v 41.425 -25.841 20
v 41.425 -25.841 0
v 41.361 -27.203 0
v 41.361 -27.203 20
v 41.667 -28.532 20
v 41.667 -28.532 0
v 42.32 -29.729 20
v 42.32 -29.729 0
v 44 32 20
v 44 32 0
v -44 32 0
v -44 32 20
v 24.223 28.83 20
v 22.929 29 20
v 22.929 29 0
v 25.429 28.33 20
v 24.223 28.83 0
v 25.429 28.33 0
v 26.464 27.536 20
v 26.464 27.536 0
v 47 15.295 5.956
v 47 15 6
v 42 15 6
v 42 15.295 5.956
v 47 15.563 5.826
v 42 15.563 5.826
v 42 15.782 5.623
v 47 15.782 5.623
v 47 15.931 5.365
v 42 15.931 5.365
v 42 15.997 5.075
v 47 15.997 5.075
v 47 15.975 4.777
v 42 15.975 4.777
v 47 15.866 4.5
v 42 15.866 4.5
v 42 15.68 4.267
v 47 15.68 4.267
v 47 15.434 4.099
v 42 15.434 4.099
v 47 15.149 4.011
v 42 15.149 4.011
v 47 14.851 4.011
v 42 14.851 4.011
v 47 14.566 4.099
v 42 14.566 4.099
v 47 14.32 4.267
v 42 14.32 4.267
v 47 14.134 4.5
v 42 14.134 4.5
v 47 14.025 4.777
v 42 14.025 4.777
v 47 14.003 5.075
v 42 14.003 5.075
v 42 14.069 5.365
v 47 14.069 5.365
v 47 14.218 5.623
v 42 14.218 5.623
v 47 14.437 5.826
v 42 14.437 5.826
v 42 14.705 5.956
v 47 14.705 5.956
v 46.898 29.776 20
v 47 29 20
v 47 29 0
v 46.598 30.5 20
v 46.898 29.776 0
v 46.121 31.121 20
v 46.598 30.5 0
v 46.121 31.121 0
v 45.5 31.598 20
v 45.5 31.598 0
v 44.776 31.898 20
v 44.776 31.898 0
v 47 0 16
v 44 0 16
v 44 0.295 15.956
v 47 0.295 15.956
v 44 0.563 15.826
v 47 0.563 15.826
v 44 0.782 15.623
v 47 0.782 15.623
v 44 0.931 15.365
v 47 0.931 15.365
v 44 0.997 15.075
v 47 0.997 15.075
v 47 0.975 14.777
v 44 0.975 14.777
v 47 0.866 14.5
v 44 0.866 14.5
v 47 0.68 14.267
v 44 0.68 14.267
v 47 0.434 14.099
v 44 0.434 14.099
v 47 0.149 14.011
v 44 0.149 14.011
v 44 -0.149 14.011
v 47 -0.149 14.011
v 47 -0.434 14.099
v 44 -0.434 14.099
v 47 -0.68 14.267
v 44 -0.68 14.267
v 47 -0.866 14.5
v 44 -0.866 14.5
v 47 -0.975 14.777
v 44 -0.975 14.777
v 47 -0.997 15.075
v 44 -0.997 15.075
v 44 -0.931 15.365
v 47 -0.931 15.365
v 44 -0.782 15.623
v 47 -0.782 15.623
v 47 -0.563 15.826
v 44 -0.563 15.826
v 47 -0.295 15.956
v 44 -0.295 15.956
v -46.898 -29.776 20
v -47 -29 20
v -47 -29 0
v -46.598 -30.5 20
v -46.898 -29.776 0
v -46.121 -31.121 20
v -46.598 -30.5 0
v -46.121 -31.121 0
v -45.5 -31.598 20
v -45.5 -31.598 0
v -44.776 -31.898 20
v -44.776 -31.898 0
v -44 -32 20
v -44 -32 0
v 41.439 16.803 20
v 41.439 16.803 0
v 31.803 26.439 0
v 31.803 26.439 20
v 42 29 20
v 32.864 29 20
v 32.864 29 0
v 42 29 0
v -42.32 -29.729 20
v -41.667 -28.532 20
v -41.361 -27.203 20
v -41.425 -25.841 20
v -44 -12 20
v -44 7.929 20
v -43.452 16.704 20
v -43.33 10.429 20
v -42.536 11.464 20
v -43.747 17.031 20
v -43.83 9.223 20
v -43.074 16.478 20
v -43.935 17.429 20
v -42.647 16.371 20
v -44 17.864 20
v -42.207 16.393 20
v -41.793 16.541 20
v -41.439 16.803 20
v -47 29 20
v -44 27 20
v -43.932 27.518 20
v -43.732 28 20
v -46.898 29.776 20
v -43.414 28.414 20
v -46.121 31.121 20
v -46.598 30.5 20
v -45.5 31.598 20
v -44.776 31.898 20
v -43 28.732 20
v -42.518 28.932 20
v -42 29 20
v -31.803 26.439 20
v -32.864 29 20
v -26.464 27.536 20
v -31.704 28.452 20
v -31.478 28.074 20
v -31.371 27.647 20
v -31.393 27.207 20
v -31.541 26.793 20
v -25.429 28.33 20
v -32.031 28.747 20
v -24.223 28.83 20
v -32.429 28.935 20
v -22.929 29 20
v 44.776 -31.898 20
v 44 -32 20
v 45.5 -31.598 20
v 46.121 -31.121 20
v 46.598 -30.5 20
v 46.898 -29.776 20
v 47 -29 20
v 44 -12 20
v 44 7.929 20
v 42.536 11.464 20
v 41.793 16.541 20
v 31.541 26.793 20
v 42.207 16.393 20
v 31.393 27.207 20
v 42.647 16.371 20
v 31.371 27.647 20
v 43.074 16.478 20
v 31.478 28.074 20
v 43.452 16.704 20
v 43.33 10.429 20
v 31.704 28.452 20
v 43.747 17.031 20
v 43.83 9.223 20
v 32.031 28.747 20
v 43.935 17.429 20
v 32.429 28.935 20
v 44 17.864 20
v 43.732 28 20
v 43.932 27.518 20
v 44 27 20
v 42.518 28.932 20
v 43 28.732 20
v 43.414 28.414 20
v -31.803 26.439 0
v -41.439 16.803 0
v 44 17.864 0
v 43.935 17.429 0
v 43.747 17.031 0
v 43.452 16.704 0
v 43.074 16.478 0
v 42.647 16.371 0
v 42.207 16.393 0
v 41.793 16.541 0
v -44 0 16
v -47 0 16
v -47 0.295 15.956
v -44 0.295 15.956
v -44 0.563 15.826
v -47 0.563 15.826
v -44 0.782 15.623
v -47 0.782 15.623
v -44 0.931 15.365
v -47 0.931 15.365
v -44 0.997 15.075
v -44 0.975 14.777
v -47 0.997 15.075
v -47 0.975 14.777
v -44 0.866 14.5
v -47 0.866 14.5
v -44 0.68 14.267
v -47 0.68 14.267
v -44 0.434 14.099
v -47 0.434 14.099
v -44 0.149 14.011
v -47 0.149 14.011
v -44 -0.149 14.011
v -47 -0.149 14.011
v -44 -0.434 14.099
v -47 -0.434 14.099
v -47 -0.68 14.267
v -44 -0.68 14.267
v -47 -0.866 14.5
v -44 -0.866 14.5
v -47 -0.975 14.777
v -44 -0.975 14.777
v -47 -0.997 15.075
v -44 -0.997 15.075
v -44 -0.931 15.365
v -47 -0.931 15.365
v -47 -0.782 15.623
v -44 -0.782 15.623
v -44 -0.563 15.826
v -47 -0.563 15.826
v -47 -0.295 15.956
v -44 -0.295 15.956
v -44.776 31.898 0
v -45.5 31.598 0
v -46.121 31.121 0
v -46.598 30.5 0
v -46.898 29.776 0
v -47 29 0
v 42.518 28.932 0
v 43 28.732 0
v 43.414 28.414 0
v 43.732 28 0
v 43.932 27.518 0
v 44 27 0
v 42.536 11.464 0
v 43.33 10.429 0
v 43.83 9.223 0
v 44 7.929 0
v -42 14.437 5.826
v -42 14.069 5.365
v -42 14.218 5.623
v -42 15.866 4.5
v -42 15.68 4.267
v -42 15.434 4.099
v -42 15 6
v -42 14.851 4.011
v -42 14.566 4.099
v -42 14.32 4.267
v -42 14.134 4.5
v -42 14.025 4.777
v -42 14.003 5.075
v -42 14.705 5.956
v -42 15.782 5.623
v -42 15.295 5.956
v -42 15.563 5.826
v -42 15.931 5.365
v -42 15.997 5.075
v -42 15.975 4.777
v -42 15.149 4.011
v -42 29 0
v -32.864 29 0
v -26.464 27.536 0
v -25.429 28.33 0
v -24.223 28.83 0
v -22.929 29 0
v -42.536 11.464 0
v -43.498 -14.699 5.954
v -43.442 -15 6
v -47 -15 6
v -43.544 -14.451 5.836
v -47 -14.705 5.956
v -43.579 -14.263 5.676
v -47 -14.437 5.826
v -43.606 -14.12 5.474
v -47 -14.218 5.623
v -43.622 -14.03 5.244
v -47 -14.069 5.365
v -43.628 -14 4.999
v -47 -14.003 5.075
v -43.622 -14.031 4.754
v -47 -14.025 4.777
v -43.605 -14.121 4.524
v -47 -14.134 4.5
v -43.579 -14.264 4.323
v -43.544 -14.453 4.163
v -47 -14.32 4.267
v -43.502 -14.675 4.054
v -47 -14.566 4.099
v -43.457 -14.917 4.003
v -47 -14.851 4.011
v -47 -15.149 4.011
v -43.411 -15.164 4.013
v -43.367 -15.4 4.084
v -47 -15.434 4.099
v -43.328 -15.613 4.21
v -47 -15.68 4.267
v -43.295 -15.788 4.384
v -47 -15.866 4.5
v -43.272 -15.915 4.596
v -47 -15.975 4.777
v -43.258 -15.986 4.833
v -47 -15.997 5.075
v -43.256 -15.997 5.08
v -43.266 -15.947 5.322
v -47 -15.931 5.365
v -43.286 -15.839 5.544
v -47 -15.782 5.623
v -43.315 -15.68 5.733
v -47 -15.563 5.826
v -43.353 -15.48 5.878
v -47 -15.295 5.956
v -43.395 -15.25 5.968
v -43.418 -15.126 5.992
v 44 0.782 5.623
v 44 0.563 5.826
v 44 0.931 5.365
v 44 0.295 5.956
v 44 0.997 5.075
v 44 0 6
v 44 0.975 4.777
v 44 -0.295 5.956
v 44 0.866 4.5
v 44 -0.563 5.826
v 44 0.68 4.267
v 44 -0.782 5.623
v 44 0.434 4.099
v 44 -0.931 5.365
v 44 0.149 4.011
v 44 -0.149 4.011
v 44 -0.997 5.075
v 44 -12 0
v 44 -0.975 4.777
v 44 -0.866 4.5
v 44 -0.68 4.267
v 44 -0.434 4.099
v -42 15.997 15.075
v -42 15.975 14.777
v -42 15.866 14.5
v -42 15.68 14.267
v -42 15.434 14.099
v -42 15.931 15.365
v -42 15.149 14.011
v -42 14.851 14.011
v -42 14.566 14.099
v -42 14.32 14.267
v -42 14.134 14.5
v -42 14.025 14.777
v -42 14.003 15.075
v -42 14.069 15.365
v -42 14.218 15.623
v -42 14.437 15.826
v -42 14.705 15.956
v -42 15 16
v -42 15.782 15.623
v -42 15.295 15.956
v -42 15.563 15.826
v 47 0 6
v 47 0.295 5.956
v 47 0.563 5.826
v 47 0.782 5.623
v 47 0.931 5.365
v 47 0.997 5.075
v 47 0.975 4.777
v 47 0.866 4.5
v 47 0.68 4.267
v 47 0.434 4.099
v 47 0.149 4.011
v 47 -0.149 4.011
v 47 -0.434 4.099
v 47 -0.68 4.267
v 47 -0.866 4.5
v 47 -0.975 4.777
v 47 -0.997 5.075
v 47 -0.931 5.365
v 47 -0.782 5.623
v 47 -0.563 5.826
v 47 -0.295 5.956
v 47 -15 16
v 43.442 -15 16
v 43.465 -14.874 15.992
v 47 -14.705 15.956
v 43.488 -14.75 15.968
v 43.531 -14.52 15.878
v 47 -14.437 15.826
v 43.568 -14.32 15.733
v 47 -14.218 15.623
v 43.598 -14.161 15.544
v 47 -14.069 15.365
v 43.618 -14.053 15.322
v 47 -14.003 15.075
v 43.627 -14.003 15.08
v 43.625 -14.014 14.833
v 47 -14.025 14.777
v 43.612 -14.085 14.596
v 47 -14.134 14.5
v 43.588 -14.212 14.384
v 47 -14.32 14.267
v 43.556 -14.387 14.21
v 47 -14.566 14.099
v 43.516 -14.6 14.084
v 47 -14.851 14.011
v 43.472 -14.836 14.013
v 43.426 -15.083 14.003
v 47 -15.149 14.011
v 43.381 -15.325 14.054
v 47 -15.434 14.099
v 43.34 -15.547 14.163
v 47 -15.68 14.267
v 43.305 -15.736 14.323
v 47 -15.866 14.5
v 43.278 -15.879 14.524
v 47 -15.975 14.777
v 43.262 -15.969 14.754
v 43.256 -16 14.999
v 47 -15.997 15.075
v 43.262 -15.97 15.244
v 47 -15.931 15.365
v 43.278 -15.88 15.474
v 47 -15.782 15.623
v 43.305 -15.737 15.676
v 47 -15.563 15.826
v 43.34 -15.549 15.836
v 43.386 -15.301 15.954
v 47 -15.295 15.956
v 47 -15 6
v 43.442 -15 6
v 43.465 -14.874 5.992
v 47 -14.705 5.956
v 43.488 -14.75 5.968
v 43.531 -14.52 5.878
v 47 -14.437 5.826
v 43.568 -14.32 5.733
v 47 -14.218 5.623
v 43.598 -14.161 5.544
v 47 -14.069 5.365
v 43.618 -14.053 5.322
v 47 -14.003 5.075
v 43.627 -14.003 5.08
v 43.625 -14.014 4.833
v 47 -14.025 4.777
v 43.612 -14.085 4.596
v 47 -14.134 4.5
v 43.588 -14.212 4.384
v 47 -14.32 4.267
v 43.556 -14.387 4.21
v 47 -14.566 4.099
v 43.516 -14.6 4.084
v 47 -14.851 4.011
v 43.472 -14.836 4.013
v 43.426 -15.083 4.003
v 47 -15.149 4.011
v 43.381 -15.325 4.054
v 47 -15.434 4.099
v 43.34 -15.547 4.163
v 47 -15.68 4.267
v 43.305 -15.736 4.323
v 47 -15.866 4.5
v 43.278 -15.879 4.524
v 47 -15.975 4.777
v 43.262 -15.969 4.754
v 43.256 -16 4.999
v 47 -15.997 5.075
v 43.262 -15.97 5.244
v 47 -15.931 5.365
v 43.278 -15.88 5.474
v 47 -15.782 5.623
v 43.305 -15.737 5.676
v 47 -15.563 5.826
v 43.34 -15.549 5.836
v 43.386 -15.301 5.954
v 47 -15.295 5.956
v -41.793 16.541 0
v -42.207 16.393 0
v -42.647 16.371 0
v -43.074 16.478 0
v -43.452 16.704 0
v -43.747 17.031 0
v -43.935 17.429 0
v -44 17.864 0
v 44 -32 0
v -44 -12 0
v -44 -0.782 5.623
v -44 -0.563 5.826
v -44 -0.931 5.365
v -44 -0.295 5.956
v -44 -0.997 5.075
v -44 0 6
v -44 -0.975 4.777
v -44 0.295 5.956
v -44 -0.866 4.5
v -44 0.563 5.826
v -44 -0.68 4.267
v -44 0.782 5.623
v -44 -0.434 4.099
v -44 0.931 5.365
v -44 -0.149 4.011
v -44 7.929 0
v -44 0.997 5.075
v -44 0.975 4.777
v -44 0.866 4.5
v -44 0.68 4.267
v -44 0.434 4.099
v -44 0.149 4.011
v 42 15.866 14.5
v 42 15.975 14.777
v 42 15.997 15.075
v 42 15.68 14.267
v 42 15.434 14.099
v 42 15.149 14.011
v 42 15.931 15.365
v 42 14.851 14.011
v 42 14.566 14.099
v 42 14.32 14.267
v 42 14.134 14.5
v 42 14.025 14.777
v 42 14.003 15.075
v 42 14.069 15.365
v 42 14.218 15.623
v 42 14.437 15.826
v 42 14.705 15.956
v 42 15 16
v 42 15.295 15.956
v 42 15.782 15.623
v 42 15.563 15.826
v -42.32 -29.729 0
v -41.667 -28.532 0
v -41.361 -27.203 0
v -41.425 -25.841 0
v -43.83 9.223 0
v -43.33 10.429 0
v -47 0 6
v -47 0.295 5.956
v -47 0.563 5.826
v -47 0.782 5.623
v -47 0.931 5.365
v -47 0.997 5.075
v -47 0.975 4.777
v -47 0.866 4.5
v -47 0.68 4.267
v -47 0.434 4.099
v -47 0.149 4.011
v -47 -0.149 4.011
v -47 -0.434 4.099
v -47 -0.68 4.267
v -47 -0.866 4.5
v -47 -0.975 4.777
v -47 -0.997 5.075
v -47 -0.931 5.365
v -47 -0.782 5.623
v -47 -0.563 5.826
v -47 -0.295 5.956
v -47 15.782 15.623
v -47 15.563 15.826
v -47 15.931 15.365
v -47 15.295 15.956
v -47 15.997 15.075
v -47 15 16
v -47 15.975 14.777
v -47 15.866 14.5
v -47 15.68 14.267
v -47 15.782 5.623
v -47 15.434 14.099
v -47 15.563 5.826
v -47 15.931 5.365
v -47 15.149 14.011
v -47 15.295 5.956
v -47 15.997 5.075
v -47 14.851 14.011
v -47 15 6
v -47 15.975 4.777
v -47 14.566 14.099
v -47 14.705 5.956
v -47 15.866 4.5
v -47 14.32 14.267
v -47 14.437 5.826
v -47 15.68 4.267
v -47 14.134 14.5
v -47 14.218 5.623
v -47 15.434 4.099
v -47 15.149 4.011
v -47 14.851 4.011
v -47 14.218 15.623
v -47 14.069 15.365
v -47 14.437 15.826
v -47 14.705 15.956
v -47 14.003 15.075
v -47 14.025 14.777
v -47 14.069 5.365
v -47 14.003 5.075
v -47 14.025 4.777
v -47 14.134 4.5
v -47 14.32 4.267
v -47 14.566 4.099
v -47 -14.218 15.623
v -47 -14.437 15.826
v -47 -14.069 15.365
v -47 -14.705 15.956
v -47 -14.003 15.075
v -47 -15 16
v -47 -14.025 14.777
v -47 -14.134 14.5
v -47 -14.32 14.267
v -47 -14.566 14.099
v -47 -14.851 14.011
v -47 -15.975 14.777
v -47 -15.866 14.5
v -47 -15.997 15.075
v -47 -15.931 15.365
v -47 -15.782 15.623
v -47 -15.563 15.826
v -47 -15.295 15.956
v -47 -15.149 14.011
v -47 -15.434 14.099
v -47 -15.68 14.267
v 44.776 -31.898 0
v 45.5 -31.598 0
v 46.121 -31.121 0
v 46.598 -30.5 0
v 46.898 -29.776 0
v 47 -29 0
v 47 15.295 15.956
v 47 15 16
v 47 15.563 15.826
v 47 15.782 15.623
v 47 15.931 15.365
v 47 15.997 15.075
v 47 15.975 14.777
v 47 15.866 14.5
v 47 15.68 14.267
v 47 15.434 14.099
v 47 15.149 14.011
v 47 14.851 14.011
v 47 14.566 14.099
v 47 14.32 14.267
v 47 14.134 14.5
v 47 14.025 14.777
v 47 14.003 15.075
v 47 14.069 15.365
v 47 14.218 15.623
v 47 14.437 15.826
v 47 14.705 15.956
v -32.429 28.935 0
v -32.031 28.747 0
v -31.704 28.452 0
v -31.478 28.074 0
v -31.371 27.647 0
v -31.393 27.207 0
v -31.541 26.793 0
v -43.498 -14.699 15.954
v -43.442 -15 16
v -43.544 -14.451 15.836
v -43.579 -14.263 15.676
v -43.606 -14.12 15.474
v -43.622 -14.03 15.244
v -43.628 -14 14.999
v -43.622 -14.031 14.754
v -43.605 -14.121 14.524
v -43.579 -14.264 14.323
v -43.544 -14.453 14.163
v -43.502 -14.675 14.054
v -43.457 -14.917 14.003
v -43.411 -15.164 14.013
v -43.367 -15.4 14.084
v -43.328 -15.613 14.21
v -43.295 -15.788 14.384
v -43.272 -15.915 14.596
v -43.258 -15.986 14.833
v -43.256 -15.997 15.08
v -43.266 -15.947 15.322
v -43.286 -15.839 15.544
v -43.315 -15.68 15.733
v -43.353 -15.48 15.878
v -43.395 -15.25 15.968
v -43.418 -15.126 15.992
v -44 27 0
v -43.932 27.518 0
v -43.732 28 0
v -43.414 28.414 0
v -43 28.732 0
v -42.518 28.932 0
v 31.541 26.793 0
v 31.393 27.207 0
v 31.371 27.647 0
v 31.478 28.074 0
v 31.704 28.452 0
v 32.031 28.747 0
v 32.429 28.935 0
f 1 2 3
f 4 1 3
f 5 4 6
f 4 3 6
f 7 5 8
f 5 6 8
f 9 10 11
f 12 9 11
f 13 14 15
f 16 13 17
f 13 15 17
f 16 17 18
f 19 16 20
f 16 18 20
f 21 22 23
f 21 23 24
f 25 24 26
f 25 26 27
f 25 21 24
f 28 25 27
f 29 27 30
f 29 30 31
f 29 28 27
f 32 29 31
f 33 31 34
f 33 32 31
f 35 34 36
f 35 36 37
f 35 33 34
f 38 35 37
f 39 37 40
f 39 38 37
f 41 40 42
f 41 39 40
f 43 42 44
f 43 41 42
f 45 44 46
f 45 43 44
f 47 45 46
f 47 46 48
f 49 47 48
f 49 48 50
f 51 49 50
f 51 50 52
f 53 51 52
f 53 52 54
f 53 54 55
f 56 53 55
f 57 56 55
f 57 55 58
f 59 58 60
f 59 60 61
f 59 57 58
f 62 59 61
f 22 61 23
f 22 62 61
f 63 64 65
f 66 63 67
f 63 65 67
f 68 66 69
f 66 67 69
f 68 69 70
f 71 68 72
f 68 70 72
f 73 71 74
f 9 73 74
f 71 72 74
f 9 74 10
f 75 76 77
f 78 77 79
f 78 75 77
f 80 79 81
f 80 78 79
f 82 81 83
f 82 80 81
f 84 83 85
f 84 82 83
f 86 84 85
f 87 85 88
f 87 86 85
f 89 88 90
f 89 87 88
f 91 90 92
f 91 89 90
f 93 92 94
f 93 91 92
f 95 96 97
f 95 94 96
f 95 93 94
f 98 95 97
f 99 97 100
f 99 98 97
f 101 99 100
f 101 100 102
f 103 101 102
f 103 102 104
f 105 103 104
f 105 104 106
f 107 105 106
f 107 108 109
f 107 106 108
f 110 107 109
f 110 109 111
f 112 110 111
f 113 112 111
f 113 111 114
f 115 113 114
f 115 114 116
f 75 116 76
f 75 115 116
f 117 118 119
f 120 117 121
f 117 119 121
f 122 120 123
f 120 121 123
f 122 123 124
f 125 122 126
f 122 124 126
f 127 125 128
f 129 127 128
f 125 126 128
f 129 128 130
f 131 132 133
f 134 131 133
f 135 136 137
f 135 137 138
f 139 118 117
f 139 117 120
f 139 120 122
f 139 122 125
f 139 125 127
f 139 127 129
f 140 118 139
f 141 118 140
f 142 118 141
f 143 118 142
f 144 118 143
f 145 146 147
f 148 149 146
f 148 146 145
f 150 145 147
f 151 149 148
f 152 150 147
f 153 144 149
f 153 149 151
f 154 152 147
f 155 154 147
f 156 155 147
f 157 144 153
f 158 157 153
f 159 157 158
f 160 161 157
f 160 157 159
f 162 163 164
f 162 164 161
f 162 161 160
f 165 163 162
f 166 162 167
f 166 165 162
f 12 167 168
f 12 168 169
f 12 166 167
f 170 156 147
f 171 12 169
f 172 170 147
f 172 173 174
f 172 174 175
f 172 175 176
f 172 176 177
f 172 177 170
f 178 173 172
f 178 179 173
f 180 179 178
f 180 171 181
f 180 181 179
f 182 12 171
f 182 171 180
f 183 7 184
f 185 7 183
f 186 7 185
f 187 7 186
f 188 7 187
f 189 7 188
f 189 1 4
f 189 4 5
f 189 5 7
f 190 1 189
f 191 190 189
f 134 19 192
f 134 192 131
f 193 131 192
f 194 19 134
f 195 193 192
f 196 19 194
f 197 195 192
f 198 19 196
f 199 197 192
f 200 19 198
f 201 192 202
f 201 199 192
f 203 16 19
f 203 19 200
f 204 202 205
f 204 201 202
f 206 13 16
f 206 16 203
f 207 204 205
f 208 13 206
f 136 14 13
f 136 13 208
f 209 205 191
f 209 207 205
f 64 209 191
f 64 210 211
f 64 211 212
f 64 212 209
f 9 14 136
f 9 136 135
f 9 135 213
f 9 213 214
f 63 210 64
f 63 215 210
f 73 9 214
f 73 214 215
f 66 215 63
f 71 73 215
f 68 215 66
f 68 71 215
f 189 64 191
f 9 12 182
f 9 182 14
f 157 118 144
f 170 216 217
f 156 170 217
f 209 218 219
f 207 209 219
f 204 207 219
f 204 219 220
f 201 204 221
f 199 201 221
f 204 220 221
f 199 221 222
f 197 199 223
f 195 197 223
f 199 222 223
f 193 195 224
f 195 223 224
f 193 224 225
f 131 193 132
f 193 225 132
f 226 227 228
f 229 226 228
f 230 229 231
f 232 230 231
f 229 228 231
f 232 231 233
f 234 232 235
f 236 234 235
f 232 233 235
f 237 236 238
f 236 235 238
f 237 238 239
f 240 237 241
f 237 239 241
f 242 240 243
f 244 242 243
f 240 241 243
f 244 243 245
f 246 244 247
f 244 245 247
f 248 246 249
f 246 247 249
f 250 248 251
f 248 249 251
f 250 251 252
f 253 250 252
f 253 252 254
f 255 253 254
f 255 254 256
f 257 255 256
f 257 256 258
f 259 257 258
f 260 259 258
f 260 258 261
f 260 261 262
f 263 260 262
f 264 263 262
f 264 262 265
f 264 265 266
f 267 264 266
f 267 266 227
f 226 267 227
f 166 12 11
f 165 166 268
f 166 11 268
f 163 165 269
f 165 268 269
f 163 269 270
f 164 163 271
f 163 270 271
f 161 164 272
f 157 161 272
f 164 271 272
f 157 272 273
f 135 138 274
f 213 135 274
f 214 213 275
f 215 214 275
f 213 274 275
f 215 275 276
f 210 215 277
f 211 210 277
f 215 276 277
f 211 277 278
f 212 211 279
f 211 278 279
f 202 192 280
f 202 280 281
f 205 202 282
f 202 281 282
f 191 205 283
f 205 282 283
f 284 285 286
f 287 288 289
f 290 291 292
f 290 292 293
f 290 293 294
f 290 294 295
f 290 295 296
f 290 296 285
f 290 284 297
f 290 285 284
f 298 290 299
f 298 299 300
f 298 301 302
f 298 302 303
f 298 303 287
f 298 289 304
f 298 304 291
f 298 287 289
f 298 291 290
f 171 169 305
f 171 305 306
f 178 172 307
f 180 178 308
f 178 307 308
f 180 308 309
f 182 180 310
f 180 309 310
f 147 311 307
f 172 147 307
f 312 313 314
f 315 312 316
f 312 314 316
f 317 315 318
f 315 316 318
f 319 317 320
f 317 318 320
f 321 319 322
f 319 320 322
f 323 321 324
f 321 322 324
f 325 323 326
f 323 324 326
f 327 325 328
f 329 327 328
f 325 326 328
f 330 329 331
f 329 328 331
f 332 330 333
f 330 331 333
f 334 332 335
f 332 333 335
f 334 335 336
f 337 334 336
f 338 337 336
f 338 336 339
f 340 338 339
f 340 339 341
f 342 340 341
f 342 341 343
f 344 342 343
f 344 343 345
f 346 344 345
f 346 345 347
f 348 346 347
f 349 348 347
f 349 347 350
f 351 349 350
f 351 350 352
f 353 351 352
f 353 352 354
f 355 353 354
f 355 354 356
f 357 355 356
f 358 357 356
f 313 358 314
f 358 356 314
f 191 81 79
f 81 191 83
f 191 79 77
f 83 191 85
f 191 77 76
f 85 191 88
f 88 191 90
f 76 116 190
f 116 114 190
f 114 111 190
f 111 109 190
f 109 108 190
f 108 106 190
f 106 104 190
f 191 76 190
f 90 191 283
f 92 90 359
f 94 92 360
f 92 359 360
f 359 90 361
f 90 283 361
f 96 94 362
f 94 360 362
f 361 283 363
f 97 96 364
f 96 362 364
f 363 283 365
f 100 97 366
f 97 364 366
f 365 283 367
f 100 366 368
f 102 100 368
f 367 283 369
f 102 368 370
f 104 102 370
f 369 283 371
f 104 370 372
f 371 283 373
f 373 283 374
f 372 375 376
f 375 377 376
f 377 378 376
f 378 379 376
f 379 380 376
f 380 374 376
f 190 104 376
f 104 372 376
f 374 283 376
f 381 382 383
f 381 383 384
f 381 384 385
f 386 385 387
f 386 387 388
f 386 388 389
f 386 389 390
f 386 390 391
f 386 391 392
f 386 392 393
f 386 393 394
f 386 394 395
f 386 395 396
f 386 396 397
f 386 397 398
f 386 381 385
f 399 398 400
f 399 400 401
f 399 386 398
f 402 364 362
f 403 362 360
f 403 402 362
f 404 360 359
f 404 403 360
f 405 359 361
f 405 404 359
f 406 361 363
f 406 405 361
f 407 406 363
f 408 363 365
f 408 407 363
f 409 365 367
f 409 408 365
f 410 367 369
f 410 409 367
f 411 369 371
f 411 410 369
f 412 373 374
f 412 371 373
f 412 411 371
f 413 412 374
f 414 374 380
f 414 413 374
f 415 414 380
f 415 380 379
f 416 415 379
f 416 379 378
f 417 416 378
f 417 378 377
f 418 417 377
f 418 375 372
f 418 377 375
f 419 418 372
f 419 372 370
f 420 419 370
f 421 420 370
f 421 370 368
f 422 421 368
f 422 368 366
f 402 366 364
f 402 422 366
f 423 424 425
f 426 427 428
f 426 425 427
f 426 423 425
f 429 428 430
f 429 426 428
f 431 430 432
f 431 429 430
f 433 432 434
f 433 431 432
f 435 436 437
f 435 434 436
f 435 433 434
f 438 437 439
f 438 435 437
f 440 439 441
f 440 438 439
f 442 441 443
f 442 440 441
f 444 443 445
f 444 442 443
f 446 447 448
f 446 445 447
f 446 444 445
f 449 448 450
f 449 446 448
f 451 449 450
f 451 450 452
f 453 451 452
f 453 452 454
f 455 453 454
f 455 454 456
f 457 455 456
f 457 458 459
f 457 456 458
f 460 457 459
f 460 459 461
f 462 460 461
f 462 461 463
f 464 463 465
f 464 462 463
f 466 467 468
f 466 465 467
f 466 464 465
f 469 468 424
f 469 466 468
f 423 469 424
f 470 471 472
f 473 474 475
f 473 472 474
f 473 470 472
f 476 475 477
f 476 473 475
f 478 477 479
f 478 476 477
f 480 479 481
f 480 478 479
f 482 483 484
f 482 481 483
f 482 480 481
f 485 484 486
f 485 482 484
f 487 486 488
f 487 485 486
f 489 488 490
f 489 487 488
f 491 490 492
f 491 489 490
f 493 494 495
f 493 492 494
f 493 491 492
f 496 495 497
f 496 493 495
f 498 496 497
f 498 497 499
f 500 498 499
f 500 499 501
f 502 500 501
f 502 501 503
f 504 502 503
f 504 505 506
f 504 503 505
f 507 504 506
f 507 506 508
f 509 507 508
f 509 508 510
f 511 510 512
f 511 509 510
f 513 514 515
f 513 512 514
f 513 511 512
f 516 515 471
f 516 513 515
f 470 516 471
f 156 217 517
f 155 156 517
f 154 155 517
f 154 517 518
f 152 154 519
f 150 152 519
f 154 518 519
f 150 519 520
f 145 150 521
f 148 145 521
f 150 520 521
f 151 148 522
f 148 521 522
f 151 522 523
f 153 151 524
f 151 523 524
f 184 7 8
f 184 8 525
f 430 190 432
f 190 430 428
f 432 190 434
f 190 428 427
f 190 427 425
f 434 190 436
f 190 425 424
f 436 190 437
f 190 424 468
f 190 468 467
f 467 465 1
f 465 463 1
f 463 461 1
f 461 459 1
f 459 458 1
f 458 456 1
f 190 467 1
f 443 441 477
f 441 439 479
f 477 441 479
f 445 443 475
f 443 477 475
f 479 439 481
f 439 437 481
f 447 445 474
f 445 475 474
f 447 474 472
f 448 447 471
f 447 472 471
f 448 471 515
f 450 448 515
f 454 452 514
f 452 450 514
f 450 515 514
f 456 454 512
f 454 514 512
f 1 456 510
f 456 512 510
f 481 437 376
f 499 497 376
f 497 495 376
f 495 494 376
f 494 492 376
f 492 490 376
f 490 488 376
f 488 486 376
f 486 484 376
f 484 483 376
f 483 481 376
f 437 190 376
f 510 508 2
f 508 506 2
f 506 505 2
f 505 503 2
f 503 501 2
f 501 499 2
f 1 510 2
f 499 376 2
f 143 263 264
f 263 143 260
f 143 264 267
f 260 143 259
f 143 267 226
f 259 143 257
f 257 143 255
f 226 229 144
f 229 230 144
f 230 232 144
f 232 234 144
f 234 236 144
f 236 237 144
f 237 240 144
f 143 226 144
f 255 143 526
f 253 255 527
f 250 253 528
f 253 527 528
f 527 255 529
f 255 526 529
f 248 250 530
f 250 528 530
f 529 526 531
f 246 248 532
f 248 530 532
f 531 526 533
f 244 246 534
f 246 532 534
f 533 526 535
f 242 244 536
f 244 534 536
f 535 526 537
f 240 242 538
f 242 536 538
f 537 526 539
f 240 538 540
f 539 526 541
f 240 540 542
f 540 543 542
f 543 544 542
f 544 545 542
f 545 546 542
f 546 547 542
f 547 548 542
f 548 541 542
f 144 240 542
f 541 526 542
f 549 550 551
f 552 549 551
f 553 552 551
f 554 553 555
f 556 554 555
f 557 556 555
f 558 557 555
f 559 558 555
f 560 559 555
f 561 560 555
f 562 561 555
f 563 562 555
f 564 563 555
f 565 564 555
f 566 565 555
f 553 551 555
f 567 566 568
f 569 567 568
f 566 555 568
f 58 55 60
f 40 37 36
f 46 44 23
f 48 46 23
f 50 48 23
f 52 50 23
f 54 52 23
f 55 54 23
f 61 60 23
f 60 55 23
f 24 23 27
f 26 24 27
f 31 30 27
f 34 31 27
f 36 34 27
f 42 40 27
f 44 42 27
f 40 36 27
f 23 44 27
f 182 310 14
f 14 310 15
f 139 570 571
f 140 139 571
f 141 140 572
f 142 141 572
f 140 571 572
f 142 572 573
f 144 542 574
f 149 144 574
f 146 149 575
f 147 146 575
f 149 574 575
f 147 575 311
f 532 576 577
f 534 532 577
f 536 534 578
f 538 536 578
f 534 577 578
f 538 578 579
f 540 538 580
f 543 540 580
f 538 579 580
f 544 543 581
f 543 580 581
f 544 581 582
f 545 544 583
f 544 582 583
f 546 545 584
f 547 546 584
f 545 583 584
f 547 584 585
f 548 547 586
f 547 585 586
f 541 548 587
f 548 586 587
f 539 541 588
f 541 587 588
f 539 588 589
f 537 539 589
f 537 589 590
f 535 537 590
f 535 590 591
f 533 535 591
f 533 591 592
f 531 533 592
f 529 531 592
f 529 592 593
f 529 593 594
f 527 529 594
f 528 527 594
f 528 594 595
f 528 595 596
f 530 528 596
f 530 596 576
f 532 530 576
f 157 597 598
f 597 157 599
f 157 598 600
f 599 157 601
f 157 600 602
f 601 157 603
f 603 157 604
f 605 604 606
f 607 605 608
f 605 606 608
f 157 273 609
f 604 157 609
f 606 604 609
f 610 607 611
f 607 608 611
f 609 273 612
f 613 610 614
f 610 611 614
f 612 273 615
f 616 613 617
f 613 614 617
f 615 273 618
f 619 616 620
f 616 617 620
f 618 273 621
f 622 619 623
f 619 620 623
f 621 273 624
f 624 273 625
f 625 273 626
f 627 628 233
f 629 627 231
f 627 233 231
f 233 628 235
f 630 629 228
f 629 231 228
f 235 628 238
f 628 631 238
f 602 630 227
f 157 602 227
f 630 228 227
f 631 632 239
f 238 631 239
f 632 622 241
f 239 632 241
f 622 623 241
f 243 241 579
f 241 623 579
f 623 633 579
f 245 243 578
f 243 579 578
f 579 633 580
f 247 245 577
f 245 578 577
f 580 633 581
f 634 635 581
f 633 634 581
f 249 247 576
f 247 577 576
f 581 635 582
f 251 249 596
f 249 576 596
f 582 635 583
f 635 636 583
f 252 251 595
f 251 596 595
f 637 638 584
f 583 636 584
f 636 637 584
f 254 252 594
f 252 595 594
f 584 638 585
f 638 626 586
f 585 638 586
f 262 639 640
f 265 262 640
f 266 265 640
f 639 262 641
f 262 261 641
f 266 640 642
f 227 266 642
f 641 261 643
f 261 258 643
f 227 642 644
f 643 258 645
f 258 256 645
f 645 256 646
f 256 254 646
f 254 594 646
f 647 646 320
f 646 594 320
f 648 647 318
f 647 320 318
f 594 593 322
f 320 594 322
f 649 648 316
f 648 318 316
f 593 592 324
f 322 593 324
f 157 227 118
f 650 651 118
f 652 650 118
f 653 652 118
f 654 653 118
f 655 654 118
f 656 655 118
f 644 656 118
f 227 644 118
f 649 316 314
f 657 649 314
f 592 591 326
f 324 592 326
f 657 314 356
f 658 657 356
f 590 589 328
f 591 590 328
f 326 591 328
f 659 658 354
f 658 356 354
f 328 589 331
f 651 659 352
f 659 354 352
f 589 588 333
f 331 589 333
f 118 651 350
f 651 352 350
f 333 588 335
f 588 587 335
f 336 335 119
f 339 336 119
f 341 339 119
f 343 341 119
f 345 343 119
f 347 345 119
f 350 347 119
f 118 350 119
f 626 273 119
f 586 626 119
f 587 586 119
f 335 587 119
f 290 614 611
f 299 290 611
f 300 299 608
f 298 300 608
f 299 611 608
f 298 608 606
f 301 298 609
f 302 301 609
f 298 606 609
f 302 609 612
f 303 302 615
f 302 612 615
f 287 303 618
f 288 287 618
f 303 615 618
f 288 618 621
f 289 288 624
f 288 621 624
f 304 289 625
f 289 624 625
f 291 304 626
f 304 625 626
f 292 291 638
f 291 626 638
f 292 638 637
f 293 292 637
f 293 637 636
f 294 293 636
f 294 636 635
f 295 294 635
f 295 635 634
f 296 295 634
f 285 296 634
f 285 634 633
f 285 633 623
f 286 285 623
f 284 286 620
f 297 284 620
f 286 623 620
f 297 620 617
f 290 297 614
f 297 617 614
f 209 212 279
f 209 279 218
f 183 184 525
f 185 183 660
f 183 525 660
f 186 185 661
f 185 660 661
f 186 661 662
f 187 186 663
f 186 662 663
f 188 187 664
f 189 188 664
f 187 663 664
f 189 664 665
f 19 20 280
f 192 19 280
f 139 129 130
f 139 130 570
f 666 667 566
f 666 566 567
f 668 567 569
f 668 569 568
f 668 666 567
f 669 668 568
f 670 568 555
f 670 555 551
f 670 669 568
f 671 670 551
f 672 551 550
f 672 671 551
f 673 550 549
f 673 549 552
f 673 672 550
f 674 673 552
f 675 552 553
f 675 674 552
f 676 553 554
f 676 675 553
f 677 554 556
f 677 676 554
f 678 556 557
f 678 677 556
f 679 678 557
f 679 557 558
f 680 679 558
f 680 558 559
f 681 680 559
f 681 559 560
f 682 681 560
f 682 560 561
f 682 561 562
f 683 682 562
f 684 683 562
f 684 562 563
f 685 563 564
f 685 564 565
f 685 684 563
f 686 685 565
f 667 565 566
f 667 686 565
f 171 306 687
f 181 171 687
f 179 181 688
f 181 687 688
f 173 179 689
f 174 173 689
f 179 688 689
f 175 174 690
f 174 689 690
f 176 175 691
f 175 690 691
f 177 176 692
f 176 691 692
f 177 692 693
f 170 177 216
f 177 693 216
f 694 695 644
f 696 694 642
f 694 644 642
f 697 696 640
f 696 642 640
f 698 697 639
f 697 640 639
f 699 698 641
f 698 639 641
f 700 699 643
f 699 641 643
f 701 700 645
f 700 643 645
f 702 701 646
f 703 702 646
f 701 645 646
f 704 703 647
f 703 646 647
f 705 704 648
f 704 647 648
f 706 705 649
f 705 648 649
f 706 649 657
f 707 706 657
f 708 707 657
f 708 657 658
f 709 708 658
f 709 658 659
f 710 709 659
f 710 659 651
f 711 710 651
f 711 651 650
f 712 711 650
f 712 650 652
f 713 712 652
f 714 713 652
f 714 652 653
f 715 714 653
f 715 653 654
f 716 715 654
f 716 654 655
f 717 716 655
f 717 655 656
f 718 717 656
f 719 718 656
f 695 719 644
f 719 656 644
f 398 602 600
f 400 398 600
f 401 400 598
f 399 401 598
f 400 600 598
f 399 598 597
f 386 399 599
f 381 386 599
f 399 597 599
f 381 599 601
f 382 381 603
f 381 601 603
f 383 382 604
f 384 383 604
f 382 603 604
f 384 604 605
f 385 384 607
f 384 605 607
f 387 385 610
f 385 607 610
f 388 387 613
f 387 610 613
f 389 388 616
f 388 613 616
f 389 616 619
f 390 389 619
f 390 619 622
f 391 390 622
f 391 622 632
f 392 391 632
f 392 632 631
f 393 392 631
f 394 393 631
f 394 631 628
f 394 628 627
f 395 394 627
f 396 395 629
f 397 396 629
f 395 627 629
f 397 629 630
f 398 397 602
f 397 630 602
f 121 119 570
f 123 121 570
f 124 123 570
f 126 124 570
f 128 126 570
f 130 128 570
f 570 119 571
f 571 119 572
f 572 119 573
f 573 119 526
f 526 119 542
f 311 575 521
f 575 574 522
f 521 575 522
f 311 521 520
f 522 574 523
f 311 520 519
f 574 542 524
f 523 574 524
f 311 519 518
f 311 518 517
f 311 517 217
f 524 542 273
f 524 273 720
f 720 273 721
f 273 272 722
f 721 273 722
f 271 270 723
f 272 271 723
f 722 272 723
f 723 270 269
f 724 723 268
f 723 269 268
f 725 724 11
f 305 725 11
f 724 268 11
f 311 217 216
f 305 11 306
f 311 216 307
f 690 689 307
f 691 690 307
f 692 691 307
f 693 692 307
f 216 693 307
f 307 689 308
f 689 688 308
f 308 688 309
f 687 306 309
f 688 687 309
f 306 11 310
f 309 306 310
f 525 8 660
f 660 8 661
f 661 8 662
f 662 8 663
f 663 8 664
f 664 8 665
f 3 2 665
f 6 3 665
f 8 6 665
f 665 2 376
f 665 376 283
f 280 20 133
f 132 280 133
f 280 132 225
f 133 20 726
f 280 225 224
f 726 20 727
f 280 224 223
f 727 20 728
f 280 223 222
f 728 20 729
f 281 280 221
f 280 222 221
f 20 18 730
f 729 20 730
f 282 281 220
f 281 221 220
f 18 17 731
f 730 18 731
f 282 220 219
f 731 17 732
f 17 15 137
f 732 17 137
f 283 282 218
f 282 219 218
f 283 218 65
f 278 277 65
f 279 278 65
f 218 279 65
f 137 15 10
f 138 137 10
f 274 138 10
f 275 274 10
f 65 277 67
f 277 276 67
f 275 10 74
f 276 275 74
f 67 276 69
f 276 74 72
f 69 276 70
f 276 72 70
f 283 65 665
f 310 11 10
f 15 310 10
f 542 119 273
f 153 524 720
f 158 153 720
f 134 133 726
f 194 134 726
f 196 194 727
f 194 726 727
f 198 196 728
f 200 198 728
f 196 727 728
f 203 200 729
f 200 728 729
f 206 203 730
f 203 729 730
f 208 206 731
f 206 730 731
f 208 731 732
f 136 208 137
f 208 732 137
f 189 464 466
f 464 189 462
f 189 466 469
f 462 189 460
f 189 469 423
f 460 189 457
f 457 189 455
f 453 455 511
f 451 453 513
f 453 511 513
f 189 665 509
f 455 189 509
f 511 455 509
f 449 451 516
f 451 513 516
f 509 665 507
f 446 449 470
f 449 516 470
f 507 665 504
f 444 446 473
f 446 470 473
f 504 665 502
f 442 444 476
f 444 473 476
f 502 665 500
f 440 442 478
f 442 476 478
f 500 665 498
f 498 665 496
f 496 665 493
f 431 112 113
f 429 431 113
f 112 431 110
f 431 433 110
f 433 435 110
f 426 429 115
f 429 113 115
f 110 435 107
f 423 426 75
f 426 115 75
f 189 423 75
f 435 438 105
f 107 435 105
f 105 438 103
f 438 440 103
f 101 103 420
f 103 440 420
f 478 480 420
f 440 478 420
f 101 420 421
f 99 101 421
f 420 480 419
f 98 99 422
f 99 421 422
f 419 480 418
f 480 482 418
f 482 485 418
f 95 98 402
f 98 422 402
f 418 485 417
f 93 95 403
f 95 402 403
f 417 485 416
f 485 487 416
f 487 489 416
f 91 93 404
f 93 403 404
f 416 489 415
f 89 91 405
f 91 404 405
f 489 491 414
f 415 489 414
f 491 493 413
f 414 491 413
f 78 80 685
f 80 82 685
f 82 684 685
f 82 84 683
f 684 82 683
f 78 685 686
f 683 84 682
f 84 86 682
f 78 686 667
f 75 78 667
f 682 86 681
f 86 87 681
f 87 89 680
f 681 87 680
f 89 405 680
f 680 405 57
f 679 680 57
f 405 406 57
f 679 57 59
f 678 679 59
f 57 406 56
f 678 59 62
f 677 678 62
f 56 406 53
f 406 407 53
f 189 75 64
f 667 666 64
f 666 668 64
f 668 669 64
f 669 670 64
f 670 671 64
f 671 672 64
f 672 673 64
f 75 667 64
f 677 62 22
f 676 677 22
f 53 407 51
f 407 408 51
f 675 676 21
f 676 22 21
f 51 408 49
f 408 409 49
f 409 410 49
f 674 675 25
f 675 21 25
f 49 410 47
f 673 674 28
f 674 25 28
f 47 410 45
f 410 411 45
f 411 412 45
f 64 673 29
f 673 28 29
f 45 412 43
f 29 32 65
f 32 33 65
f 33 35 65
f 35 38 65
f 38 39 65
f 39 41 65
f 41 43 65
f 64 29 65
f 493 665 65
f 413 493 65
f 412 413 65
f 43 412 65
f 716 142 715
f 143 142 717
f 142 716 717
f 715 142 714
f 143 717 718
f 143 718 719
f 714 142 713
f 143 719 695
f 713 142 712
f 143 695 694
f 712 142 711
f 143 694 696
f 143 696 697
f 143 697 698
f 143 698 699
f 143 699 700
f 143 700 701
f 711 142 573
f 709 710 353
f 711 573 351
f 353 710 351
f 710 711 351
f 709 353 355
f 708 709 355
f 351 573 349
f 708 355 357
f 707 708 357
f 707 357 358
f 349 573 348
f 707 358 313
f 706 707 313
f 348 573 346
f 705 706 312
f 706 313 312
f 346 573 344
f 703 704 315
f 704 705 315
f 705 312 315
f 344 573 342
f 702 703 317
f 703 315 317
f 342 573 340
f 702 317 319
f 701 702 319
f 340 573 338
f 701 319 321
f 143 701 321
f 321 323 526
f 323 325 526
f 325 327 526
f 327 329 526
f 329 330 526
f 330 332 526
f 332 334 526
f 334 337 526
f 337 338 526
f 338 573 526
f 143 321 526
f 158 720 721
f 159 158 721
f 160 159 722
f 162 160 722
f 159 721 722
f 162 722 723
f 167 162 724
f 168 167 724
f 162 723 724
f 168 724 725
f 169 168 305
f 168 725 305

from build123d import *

# Parameters (mm, degrees)
BOSS_EXTRUDE2_DEPTH = 20
SKETCH2_R           = 1
CUT_EXTRUDE1_DEPTH  = 5


with BuildPart() as part:
    # Sketch1 → Boss-Extrude2 (new body)
    with BuildSketch(Plane.XY):
        with BuildLine():
            ThreePointArc((-47, -29), (-46.121320344, -31.121320344), (-44, -32))
            Line((-44, -32), (-42.320425457, -29.72852746))
            ThreePointArc((-42.320425457, -29.72852746), (-41.468325666, -27.878092848), (-41.42508346, -25.841352212))
            Line((-41.42508346, -25.841352212), (-44, -12))
            Line((-44, -12), (-44, 7.928932188))
            ThreePointArc((-44, 7.928932188), (-43.619397663, 9.84234935), (-42.535533906, 11.464466094))
            Line((-42.535533906, 11.464466094), (-26.464466094, 27.535533906))
            ThreePointArc((-26.464466094, 27.535533906), (-24.84234935, 28.619397663), (-22.928932188, 29))
            Line((-22.928932188, 29), (22.928932188, 29))
            ThreePointArc((22.928932188, 29), (24.84234935, 28.619397663), (26.464466094, 27.535533906))
            Line((26.464466094, 27.535533906), (42.535533906, 11.464466094))
            ThreePointArc((42.535533906, 11.464466094), (43.619397663, 9.84234935), (44, 7.928932188))
            Line((44, 7.928932188), (44, -12))
            Line((44, -12), (41.42508346, -25.841352212))
            ThreePointArc((41.42508346, -25.841352212), (41.468325666, -27.878092848), (42.320425457, -29.72852746))
            Line((42.320425457, -29.72852746), (44, -32))
            ThreePointArc((44, -32), (46.121320344, -31.121320344), (47, -29))
            Line((47, -29), (47, 29))
            ThreePointArc((47, 29), (46.121320344, 31.121320344), (44, 32))
            Line((44, 32), (-44, 32))
            ThreePointArc((-44, 32), (-46.121320344, 31.121320344), (-47, 29))
            Line((-47, 29), (-47, -29))
        make_face()
        with BuildLine():
            ThreePointArc((-44, 27), (-43.414213562, 28.414213562), (-42, 29))
            Line((-42, 29), (-32.863961031, 29))
            ThreePointArc((-32.863961031, 29), (-31.478141732, 28.074025149), (-31.803300859, 26.439339828))
            Line((-31.803300859, 26.439339828), (-41.439339828, 16.803300859))
            ThreePointArc((-41.439339828, 16.803300859), (-43.074025149, 16.478141732), (-44, 17.863961031))
            Line((-44, 17.863961031), (-44, 27))
        make_face(mode=Mode.SUBTRACT)
        with BuildLine():
            ThreePointArc((42, 29), (43.414213562, 28.414213562), (44, 27))
            Line((44, 27), (44, 17.863961031))
            ThreePointArc((44, 17.863961031), (43.074025149, 16.478141732), (41.439339828, 16.803300859))
            Line((41.439339828, 16.803300859), (31.803300859, 26.439339828))
            ThreePointArc((31.803300859, 26.439339828), (31.478141732, 28.074025149), (32.863961031, 29))
            Line((32.863961031, 29), (42, 29))
        make_face(mode=Mode.SUBTRACT)
    extrude(amount=BOSS_EXTRUDE2_DEPTH)

    # Sketch2 → Cut-Extrude1 (cut)
    with BuildSketch(Plane.ZY.offset(47)):
        with Locations((5, 15)):
            Circle(SKETCH2_R)
        with Locations((15, 15)):
            Circle(SKETCH2_R)
        with Locations((15, 0)):
            Circle(SKETCH2_R)
        with Locations((15, -15)):
            Circle(SKETCH2_R)
        with Locations((5, 0)):
            Circle(SKETCH2_R)
        with Locations((5, -15)):
            Circle(SKETCH2_R)
    cut_extrude1 = extrude(amount=-CUT_EXTRUDE1_DEPTH, mode=Mode.SUBTRACT)

    # Mirror1: Cut-Extrude1 across plane
    add(cut_extrude1.mirror(Plane(origin=(0, 0, 0), x_dir=(0, 0, 1), z_dir=(1, 0, 0))), mode=Mode.SUBTRACT)


solid = part.part
